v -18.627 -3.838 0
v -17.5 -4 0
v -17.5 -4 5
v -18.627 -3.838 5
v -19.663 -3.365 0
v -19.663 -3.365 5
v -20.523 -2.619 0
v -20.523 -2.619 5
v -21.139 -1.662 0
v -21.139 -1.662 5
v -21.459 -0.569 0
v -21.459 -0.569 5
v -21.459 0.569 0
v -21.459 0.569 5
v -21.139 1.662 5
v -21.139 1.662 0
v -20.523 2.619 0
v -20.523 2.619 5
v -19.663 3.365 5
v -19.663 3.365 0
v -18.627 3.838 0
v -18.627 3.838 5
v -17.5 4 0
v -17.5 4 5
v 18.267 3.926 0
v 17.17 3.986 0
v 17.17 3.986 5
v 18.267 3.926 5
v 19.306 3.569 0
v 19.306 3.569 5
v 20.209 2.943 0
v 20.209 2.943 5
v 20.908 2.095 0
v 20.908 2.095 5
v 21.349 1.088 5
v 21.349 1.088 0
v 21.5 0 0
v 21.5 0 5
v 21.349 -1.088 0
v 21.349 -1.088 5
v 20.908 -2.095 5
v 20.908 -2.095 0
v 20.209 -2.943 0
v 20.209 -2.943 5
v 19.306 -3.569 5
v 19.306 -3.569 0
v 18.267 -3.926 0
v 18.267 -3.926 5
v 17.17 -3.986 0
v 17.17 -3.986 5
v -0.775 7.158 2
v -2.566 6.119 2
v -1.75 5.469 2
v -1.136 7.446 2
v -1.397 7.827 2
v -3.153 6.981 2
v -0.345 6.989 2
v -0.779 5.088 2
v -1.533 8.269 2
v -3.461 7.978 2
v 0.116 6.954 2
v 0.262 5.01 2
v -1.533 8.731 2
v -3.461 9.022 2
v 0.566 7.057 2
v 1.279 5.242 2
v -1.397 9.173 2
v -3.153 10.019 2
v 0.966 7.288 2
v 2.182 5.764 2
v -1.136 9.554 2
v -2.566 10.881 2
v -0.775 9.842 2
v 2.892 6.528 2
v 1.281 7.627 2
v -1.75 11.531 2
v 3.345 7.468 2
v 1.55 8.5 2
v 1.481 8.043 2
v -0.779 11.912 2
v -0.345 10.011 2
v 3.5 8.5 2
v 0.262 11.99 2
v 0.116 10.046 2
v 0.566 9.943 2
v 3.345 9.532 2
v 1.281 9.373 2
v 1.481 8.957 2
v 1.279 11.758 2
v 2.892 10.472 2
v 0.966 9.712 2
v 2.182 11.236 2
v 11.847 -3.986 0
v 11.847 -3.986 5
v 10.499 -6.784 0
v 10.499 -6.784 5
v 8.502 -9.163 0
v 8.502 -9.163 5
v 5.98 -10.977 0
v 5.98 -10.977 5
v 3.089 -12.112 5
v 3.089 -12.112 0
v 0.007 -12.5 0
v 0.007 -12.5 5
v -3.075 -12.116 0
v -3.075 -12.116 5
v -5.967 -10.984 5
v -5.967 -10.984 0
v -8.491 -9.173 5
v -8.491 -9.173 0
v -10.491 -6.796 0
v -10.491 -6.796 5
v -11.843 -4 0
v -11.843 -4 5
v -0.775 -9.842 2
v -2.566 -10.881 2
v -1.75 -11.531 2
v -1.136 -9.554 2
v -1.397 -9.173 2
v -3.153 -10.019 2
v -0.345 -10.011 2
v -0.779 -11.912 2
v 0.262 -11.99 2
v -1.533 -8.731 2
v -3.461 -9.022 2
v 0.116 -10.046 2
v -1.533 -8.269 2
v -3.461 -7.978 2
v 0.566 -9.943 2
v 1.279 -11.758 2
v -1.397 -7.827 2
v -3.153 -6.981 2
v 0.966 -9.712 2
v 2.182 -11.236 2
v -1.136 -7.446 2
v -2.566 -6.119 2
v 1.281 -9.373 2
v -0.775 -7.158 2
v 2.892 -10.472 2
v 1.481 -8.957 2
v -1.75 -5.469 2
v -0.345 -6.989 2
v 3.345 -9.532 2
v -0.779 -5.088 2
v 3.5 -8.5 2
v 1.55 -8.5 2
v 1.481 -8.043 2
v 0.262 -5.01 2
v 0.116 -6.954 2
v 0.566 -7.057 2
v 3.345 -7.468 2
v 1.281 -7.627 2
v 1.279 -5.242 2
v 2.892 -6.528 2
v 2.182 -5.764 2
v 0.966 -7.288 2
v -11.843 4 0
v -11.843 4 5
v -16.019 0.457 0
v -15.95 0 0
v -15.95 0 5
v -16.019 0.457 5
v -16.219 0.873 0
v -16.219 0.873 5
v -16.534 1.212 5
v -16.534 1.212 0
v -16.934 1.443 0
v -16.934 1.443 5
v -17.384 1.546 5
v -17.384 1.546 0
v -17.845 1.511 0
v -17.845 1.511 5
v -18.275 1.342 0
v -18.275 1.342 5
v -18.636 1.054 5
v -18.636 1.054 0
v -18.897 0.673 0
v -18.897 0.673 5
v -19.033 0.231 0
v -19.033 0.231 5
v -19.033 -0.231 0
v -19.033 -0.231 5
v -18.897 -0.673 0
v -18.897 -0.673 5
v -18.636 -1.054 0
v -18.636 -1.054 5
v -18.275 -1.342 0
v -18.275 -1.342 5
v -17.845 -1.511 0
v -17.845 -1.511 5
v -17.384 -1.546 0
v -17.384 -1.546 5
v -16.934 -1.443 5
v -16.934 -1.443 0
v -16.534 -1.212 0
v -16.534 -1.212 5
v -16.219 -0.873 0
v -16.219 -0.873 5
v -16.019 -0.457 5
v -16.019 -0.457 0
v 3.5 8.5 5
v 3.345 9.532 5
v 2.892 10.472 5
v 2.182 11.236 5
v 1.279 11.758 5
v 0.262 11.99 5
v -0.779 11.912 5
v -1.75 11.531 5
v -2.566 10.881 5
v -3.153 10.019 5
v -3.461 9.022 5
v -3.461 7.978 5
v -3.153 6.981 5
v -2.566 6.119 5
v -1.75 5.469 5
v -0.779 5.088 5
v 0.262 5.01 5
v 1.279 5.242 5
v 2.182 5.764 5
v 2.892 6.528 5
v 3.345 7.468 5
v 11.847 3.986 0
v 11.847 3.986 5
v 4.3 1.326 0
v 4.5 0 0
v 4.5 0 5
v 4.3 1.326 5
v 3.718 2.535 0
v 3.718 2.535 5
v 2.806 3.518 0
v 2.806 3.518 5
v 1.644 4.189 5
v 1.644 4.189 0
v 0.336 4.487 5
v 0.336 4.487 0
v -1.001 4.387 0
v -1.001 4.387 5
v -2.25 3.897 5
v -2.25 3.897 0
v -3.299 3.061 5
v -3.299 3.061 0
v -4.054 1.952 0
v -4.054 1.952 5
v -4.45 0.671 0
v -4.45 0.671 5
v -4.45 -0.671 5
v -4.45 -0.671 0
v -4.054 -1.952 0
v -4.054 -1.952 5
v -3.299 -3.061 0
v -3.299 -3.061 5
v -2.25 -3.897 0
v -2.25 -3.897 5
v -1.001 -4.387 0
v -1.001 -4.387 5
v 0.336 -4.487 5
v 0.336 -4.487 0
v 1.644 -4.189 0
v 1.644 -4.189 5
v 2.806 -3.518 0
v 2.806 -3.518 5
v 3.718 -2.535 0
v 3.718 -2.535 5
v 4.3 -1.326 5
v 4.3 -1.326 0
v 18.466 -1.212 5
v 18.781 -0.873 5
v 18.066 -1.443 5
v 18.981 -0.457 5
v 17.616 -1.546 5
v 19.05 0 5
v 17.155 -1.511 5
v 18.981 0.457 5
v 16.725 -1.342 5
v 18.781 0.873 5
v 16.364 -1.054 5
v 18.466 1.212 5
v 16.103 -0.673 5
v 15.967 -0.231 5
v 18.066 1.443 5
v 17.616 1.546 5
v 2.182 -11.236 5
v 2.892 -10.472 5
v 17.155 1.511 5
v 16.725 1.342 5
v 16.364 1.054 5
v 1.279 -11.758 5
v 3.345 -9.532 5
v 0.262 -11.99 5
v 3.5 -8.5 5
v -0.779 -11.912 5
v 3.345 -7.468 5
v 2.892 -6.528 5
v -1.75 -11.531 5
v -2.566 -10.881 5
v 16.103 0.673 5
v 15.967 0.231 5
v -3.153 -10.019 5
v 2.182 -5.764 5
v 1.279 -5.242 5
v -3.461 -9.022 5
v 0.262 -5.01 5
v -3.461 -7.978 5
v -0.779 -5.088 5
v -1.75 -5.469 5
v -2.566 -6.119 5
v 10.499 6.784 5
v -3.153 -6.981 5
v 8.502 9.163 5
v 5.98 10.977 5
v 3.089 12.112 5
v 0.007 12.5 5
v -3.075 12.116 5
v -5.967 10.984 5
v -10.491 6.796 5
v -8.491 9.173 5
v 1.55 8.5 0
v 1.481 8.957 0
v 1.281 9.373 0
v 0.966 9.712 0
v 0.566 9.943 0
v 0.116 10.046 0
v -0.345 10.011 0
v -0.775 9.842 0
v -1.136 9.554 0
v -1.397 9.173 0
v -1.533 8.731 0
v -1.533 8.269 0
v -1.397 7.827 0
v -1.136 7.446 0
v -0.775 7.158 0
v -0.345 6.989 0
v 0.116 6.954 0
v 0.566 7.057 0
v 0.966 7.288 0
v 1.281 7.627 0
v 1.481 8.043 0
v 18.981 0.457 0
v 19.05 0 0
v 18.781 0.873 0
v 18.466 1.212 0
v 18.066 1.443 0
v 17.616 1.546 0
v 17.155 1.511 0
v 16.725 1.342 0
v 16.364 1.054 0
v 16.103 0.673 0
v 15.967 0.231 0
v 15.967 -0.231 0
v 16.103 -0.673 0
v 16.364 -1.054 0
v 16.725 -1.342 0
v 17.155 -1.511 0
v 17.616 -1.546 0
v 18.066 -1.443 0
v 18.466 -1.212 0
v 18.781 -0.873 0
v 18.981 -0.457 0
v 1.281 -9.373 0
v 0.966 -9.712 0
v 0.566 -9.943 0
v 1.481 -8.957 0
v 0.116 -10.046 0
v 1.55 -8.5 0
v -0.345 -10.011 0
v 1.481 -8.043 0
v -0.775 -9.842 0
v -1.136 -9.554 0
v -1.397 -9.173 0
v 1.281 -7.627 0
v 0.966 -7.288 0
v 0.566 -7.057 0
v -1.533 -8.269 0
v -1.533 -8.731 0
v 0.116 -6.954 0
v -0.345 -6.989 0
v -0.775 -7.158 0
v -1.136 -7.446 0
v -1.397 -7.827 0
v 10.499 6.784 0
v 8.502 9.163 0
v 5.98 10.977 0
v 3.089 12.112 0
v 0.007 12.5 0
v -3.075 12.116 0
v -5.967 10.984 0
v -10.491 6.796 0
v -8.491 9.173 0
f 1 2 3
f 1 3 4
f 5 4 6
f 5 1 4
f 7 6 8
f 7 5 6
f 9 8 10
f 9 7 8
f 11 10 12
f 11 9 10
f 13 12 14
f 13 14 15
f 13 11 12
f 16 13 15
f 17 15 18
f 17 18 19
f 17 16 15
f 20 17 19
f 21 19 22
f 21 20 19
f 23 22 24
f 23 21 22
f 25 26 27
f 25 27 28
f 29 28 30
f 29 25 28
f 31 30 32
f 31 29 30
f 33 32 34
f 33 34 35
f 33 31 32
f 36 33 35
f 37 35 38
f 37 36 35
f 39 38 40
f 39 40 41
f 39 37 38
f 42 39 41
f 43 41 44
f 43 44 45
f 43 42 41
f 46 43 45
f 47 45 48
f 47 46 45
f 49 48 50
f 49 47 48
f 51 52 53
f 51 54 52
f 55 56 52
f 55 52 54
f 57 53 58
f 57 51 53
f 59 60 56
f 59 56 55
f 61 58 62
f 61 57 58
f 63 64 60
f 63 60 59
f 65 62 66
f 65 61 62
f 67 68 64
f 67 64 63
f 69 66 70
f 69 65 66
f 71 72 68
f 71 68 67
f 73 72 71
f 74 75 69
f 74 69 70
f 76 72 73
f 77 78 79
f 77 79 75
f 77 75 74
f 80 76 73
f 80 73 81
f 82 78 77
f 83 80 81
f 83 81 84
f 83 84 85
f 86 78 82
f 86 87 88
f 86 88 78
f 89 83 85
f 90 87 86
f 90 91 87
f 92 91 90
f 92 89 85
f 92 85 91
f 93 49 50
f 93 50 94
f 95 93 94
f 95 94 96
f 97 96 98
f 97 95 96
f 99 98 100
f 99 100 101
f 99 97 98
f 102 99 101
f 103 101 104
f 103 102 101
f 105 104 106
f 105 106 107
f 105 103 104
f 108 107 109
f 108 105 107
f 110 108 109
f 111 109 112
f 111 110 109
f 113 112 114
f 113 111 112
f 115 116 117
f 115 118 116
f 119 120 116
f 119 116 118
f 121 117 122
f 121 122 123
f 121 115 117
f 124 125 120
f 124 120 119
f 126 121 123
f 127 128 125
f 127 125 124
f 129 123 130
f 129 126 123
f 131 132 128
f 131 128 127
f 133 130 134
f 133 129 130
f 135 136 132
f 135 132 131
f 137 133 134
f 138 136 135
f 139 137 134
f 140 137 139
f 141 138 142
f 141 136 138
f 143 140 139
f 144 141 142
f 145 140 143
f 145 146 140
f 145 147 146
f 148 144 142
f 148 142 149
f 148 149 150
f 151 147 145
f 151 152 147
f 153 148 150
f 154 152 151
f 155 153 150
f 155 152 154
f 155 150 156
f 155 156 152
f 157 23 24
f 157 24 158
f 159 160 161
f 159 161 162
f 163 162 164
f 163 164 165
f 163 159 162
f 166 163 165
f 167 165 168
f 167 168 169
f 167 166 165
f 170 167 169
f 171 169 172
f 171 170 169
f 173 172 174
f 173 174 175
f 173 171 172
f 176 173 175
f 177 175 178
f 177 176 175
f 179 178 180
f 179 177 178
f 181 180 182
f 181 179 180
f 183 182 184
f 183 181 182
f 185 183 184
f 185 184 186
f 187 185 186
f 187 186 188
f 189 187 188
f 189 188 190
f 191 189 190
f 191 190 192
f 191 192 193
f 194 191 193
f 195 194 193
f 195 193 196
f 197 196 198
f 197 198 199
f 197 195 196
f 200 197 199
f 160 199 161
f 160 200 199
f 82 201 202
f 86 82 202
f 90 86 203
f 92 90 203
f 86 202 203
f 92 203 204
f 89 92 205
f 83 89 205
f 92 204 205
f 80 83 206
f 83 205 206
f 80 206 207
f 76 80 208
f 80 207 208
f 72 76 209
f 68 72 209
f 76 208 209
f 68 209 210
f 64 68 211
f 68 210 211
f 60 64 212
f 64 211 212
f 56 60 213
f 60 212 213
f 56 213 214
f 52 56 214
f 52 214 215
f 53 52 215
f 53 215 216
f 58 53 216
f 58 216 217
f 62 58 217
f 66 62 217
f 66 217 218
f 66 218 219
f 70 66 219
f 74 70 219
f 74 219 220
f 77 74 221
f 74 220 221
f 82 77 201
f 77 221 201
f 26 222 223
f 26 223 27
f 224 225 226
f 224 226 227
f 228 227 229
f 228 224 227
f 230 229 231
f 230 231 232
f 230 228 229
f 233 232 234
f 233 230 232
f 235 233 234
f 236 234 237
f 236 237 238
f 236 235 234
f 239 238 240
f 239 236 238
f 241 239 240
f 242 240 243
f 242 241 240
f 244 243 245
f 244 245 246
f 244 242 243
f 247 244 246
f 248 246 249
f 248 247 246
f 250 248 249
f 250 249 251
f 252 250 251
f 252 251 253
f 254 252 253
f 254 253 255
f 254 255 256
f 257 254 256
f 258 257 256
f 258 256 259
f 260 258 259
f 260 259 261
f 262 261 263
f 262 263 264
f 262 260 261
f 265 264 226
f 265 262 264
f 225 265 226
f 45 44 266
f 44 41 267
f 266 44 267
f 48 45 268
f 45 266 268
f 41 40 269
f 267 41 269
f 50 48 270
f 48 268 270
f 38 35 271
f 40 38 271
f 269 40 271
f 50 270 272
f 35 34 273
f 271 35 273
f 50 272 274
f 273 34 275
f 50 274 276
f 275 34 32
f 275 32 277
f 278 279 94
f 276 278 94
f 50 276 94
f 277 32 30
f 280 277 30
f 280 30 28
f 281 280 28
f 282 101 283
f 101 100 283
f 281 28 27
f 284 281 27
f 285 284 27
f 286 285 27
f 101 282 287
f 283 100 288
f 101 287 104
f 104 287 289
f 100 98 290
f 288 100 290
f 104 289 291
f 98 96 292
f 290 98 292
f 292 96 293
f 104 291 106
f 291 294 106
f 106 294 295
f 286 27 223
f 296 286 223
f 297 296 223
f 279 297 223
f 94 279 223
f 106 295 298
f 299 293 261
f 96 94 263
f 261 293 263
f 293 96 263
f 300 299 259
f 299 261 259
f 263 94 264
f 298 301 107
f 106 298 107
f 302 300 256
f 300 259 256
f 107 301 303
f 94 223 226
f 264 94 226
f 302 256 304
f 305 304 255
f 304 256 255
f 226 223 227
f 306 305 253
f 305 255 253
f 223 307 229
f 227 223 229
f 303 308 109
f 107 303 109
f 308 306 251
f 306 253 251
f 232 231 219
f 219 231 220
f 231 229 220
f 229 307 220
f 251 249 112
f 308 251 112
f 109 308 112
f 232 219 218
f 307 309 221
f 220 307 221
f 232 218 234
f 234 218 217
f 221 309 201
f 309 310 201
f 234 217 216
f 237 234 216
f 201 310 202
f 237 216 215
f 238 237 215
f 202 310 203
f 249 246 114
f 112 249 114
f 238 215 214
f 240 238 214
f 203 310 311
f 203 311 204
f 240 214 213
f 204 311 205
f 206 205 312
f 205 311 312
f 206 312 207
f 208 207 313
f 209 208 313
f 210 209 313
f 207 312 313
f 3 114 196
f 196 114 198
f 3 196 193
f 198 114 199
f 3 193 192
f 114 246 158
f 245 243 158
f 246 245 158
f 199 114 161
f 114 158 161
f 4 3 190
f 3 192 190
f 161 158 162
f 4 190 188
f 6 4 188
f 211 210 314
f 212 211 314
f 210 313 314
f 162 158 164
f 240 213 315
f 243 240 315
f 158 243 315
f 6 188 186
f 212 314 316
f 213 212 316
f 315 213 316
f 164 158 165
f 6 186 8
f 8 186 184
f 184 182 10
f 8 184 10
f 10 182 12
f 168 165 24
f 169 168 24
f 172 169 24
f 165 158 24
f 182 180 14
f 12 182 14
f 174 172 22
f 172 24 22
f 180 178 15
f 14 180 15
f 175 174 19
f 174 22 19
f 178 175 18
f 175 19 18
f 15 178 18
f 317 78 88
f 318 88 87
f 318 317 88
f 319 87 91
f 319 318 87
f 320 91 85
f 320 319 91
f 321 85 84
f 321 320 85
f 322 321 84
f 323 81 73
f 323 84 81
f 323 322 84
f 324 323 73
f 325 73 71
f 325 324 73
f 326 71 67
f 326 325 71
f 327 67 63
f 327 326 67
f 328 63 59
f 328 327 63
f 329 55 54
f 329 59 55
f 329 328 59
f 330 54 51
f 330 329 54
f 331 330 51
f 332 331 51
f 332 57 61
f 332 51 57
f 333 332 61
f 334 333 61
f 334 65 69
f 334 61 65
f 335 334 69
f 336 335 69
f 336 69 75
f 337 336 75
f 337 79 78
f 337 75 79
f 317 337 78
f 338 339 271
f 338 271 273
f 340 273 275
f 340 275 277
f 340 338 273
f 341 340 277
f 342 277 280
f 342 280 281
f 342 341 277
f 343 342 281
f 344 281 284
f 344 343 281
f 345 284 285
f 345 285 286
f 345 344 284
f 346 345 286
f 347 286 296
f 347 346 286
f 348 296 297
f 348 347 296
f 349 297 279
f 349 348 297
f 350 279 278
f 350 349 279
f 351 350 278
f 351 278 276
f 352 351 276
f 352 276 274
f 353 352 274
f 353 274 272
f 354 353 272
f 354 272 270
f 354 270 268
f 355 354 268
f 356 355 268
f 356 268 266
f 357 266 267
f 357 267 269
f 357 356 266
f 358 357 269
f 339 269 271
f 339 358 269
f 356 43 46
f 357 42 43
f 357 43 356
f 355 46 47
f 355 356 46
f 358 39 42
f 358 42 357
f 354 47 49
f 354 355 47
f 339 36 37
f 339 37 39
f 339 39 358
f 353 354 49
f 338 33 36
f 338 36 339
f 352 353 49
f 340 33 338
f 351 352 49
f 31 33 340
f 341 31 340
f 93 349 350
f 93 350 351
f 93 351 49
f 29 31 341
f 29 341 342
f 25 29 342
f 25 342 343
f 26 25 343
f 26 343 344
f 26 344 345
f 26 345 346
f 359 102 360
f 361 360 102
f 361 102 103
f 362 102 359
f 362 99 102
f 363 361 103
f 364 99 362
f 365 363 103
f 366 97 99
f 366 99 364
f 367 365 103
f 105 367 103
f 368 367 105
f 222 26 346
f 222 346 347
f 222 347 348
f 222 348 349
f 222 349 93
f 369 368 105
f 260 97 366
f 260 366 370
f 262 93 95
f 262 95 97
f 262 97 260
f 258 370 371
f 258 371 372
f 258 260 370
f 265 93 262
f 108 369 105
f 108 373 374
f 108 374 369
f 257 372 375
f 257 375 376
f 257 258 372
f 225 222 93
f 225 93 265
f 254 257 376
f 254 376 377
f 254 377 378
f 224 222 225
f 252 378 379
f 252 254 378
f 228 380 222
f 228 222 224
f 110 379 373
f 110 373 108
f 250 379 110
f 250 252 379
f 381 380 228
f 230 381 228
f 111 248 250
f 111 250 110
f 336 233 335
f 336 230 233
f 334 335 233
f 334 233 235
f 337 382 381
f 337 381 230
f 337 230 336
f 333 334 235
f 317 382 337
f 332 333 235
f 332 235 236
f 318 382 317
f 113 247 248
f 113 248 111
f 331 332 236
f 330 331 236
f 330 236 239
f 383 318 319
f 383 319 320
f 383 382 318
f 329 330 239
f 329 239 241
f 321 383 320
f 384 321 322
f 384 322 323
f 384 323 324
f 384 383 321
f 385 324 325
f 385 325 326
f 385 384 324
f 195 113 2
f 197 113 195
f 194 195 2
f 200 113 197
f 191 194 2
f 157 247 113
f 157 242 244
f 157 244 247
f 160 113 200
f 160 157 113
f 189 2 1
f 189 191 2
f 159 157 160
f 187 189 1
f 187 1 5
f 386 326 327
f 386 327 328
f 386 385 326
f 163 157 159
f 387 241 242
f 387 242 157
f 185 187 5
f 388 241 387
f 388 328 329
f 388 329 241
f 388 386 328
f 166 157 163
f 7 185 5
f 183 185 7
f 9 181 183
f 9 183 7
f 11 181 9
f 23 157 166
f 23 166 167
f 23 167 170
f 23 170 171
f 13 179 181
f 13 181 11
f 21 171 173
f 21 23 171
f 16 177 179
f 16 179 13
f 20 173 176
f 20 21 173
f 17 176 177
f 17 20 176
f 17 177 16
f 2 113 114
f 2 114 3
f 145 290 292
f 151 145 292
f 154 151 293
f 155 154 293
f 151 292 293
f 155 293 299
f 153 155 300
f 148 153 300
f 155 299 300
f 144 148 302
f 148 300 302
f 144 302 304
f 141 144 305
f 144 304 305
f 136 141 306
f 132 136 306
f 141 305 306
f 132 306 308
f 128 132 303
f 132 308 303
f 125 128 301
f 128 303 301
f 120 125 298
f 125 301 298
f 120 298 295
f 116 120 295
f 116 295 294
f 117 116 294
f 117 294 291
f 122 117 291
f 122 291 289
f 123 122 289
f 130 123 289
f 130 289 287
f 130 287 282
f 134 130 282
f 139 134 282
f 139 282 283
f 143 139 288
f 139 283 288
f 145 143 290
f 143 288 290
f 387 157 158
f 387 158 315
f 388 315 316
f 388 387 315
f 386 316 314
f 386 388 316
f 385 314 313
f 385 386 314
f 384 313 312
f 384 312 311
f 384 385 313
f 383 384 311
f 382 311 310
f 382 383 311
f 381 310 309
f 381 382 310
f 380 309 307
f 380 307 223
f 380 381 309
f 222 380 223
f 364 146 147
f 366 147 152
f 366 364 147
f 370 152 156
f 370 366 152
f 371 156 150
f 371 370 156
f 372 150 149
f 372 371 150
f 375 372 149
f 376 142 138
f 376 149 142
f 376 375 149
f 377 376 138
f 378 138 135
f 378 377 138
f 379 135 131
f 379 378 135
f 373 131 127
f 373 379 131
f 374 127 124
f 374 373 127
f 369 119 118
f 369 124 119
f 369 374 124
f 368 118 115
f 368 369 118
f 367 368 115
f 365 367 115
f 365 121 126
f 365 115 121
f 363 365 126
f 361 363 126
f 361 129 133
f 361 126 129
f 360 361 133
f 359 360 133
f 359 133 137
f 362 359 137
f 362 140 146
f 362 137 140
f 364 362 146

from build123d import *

# Parameters (mm, degrees)
SKETCH1_R           = 1.55
SKETCH1_R_2         = 4.5
BOSS_EXTRUDE1_DEPTH = 5
SKETCH2_R           = 3.5
CUT_EXTRUDE1_DEPTH  = 3


with BuildPart() as part:
    # Sketch1 → Boss-Extrude1 (new body)
    with BuildSketch(Plane.XY):
        with BuildLine():
            Line((-17.5, 4), (-11.842719282, 4))
            ThreePointArc((-11.842719282, 4), (0.007193328, 12.49999793), (11.847315168, 3.986367182))
            Line((11.847315168, 3.986367182), (17.170035324, 3.986367182))
            ThreePointArc((17.170035324, 3.986367182), (21.5, 0), (17.170035324, -3.986367182))
            Line((17.170035324, -3.986367182), (11.847315168, -3.986367182))
            ThreePointArc((11.847315168, -3.986367182), (0.007193328, -12.49999793), (-11.842719282, -4))
            Line((-11.842719282, -4), (-17.5, -4))
            ThreePointArc((-17.5, -4), (-21.5, 0), (-17.5, 4))
        make_face()
        with Locations((-17.5, 0)):
            Circle(SKETCH1_R, mode=Mode.SUBTRACT)
        with Locations((17.5, 0)):
            Circle(SKETCH1_R, mode=Mode.SUBTRACT)
        Circle(SKETCH1_R_2, mode=Mode.SUBTRACT)
        with Locations((0, 8.5)):
            Circle(SKETCH1_R, mode=Mode.SUBTRACT)
        with Locations((0, -8.5)):
            Circle(SKETCH1_R, mode=Mode.SUBTRACT)
    extrude(amount=BOSS_EXTRUDE1_DEPTH)

    # Sketch2 → Cut-Extrude1 (cut)
    with BuildSketch(Plane.XY.offset(5)):
        with Locations((0, 8.5)):
            Circle(SKETCH2_R)
        with Locations((0, -8.5)):
            Circle(SKETCH2_R)
    extrude(amount=-CUT_EXTRUDE1_DEPTH, mode=Mode.SUBTRACT)


solid = part.part
